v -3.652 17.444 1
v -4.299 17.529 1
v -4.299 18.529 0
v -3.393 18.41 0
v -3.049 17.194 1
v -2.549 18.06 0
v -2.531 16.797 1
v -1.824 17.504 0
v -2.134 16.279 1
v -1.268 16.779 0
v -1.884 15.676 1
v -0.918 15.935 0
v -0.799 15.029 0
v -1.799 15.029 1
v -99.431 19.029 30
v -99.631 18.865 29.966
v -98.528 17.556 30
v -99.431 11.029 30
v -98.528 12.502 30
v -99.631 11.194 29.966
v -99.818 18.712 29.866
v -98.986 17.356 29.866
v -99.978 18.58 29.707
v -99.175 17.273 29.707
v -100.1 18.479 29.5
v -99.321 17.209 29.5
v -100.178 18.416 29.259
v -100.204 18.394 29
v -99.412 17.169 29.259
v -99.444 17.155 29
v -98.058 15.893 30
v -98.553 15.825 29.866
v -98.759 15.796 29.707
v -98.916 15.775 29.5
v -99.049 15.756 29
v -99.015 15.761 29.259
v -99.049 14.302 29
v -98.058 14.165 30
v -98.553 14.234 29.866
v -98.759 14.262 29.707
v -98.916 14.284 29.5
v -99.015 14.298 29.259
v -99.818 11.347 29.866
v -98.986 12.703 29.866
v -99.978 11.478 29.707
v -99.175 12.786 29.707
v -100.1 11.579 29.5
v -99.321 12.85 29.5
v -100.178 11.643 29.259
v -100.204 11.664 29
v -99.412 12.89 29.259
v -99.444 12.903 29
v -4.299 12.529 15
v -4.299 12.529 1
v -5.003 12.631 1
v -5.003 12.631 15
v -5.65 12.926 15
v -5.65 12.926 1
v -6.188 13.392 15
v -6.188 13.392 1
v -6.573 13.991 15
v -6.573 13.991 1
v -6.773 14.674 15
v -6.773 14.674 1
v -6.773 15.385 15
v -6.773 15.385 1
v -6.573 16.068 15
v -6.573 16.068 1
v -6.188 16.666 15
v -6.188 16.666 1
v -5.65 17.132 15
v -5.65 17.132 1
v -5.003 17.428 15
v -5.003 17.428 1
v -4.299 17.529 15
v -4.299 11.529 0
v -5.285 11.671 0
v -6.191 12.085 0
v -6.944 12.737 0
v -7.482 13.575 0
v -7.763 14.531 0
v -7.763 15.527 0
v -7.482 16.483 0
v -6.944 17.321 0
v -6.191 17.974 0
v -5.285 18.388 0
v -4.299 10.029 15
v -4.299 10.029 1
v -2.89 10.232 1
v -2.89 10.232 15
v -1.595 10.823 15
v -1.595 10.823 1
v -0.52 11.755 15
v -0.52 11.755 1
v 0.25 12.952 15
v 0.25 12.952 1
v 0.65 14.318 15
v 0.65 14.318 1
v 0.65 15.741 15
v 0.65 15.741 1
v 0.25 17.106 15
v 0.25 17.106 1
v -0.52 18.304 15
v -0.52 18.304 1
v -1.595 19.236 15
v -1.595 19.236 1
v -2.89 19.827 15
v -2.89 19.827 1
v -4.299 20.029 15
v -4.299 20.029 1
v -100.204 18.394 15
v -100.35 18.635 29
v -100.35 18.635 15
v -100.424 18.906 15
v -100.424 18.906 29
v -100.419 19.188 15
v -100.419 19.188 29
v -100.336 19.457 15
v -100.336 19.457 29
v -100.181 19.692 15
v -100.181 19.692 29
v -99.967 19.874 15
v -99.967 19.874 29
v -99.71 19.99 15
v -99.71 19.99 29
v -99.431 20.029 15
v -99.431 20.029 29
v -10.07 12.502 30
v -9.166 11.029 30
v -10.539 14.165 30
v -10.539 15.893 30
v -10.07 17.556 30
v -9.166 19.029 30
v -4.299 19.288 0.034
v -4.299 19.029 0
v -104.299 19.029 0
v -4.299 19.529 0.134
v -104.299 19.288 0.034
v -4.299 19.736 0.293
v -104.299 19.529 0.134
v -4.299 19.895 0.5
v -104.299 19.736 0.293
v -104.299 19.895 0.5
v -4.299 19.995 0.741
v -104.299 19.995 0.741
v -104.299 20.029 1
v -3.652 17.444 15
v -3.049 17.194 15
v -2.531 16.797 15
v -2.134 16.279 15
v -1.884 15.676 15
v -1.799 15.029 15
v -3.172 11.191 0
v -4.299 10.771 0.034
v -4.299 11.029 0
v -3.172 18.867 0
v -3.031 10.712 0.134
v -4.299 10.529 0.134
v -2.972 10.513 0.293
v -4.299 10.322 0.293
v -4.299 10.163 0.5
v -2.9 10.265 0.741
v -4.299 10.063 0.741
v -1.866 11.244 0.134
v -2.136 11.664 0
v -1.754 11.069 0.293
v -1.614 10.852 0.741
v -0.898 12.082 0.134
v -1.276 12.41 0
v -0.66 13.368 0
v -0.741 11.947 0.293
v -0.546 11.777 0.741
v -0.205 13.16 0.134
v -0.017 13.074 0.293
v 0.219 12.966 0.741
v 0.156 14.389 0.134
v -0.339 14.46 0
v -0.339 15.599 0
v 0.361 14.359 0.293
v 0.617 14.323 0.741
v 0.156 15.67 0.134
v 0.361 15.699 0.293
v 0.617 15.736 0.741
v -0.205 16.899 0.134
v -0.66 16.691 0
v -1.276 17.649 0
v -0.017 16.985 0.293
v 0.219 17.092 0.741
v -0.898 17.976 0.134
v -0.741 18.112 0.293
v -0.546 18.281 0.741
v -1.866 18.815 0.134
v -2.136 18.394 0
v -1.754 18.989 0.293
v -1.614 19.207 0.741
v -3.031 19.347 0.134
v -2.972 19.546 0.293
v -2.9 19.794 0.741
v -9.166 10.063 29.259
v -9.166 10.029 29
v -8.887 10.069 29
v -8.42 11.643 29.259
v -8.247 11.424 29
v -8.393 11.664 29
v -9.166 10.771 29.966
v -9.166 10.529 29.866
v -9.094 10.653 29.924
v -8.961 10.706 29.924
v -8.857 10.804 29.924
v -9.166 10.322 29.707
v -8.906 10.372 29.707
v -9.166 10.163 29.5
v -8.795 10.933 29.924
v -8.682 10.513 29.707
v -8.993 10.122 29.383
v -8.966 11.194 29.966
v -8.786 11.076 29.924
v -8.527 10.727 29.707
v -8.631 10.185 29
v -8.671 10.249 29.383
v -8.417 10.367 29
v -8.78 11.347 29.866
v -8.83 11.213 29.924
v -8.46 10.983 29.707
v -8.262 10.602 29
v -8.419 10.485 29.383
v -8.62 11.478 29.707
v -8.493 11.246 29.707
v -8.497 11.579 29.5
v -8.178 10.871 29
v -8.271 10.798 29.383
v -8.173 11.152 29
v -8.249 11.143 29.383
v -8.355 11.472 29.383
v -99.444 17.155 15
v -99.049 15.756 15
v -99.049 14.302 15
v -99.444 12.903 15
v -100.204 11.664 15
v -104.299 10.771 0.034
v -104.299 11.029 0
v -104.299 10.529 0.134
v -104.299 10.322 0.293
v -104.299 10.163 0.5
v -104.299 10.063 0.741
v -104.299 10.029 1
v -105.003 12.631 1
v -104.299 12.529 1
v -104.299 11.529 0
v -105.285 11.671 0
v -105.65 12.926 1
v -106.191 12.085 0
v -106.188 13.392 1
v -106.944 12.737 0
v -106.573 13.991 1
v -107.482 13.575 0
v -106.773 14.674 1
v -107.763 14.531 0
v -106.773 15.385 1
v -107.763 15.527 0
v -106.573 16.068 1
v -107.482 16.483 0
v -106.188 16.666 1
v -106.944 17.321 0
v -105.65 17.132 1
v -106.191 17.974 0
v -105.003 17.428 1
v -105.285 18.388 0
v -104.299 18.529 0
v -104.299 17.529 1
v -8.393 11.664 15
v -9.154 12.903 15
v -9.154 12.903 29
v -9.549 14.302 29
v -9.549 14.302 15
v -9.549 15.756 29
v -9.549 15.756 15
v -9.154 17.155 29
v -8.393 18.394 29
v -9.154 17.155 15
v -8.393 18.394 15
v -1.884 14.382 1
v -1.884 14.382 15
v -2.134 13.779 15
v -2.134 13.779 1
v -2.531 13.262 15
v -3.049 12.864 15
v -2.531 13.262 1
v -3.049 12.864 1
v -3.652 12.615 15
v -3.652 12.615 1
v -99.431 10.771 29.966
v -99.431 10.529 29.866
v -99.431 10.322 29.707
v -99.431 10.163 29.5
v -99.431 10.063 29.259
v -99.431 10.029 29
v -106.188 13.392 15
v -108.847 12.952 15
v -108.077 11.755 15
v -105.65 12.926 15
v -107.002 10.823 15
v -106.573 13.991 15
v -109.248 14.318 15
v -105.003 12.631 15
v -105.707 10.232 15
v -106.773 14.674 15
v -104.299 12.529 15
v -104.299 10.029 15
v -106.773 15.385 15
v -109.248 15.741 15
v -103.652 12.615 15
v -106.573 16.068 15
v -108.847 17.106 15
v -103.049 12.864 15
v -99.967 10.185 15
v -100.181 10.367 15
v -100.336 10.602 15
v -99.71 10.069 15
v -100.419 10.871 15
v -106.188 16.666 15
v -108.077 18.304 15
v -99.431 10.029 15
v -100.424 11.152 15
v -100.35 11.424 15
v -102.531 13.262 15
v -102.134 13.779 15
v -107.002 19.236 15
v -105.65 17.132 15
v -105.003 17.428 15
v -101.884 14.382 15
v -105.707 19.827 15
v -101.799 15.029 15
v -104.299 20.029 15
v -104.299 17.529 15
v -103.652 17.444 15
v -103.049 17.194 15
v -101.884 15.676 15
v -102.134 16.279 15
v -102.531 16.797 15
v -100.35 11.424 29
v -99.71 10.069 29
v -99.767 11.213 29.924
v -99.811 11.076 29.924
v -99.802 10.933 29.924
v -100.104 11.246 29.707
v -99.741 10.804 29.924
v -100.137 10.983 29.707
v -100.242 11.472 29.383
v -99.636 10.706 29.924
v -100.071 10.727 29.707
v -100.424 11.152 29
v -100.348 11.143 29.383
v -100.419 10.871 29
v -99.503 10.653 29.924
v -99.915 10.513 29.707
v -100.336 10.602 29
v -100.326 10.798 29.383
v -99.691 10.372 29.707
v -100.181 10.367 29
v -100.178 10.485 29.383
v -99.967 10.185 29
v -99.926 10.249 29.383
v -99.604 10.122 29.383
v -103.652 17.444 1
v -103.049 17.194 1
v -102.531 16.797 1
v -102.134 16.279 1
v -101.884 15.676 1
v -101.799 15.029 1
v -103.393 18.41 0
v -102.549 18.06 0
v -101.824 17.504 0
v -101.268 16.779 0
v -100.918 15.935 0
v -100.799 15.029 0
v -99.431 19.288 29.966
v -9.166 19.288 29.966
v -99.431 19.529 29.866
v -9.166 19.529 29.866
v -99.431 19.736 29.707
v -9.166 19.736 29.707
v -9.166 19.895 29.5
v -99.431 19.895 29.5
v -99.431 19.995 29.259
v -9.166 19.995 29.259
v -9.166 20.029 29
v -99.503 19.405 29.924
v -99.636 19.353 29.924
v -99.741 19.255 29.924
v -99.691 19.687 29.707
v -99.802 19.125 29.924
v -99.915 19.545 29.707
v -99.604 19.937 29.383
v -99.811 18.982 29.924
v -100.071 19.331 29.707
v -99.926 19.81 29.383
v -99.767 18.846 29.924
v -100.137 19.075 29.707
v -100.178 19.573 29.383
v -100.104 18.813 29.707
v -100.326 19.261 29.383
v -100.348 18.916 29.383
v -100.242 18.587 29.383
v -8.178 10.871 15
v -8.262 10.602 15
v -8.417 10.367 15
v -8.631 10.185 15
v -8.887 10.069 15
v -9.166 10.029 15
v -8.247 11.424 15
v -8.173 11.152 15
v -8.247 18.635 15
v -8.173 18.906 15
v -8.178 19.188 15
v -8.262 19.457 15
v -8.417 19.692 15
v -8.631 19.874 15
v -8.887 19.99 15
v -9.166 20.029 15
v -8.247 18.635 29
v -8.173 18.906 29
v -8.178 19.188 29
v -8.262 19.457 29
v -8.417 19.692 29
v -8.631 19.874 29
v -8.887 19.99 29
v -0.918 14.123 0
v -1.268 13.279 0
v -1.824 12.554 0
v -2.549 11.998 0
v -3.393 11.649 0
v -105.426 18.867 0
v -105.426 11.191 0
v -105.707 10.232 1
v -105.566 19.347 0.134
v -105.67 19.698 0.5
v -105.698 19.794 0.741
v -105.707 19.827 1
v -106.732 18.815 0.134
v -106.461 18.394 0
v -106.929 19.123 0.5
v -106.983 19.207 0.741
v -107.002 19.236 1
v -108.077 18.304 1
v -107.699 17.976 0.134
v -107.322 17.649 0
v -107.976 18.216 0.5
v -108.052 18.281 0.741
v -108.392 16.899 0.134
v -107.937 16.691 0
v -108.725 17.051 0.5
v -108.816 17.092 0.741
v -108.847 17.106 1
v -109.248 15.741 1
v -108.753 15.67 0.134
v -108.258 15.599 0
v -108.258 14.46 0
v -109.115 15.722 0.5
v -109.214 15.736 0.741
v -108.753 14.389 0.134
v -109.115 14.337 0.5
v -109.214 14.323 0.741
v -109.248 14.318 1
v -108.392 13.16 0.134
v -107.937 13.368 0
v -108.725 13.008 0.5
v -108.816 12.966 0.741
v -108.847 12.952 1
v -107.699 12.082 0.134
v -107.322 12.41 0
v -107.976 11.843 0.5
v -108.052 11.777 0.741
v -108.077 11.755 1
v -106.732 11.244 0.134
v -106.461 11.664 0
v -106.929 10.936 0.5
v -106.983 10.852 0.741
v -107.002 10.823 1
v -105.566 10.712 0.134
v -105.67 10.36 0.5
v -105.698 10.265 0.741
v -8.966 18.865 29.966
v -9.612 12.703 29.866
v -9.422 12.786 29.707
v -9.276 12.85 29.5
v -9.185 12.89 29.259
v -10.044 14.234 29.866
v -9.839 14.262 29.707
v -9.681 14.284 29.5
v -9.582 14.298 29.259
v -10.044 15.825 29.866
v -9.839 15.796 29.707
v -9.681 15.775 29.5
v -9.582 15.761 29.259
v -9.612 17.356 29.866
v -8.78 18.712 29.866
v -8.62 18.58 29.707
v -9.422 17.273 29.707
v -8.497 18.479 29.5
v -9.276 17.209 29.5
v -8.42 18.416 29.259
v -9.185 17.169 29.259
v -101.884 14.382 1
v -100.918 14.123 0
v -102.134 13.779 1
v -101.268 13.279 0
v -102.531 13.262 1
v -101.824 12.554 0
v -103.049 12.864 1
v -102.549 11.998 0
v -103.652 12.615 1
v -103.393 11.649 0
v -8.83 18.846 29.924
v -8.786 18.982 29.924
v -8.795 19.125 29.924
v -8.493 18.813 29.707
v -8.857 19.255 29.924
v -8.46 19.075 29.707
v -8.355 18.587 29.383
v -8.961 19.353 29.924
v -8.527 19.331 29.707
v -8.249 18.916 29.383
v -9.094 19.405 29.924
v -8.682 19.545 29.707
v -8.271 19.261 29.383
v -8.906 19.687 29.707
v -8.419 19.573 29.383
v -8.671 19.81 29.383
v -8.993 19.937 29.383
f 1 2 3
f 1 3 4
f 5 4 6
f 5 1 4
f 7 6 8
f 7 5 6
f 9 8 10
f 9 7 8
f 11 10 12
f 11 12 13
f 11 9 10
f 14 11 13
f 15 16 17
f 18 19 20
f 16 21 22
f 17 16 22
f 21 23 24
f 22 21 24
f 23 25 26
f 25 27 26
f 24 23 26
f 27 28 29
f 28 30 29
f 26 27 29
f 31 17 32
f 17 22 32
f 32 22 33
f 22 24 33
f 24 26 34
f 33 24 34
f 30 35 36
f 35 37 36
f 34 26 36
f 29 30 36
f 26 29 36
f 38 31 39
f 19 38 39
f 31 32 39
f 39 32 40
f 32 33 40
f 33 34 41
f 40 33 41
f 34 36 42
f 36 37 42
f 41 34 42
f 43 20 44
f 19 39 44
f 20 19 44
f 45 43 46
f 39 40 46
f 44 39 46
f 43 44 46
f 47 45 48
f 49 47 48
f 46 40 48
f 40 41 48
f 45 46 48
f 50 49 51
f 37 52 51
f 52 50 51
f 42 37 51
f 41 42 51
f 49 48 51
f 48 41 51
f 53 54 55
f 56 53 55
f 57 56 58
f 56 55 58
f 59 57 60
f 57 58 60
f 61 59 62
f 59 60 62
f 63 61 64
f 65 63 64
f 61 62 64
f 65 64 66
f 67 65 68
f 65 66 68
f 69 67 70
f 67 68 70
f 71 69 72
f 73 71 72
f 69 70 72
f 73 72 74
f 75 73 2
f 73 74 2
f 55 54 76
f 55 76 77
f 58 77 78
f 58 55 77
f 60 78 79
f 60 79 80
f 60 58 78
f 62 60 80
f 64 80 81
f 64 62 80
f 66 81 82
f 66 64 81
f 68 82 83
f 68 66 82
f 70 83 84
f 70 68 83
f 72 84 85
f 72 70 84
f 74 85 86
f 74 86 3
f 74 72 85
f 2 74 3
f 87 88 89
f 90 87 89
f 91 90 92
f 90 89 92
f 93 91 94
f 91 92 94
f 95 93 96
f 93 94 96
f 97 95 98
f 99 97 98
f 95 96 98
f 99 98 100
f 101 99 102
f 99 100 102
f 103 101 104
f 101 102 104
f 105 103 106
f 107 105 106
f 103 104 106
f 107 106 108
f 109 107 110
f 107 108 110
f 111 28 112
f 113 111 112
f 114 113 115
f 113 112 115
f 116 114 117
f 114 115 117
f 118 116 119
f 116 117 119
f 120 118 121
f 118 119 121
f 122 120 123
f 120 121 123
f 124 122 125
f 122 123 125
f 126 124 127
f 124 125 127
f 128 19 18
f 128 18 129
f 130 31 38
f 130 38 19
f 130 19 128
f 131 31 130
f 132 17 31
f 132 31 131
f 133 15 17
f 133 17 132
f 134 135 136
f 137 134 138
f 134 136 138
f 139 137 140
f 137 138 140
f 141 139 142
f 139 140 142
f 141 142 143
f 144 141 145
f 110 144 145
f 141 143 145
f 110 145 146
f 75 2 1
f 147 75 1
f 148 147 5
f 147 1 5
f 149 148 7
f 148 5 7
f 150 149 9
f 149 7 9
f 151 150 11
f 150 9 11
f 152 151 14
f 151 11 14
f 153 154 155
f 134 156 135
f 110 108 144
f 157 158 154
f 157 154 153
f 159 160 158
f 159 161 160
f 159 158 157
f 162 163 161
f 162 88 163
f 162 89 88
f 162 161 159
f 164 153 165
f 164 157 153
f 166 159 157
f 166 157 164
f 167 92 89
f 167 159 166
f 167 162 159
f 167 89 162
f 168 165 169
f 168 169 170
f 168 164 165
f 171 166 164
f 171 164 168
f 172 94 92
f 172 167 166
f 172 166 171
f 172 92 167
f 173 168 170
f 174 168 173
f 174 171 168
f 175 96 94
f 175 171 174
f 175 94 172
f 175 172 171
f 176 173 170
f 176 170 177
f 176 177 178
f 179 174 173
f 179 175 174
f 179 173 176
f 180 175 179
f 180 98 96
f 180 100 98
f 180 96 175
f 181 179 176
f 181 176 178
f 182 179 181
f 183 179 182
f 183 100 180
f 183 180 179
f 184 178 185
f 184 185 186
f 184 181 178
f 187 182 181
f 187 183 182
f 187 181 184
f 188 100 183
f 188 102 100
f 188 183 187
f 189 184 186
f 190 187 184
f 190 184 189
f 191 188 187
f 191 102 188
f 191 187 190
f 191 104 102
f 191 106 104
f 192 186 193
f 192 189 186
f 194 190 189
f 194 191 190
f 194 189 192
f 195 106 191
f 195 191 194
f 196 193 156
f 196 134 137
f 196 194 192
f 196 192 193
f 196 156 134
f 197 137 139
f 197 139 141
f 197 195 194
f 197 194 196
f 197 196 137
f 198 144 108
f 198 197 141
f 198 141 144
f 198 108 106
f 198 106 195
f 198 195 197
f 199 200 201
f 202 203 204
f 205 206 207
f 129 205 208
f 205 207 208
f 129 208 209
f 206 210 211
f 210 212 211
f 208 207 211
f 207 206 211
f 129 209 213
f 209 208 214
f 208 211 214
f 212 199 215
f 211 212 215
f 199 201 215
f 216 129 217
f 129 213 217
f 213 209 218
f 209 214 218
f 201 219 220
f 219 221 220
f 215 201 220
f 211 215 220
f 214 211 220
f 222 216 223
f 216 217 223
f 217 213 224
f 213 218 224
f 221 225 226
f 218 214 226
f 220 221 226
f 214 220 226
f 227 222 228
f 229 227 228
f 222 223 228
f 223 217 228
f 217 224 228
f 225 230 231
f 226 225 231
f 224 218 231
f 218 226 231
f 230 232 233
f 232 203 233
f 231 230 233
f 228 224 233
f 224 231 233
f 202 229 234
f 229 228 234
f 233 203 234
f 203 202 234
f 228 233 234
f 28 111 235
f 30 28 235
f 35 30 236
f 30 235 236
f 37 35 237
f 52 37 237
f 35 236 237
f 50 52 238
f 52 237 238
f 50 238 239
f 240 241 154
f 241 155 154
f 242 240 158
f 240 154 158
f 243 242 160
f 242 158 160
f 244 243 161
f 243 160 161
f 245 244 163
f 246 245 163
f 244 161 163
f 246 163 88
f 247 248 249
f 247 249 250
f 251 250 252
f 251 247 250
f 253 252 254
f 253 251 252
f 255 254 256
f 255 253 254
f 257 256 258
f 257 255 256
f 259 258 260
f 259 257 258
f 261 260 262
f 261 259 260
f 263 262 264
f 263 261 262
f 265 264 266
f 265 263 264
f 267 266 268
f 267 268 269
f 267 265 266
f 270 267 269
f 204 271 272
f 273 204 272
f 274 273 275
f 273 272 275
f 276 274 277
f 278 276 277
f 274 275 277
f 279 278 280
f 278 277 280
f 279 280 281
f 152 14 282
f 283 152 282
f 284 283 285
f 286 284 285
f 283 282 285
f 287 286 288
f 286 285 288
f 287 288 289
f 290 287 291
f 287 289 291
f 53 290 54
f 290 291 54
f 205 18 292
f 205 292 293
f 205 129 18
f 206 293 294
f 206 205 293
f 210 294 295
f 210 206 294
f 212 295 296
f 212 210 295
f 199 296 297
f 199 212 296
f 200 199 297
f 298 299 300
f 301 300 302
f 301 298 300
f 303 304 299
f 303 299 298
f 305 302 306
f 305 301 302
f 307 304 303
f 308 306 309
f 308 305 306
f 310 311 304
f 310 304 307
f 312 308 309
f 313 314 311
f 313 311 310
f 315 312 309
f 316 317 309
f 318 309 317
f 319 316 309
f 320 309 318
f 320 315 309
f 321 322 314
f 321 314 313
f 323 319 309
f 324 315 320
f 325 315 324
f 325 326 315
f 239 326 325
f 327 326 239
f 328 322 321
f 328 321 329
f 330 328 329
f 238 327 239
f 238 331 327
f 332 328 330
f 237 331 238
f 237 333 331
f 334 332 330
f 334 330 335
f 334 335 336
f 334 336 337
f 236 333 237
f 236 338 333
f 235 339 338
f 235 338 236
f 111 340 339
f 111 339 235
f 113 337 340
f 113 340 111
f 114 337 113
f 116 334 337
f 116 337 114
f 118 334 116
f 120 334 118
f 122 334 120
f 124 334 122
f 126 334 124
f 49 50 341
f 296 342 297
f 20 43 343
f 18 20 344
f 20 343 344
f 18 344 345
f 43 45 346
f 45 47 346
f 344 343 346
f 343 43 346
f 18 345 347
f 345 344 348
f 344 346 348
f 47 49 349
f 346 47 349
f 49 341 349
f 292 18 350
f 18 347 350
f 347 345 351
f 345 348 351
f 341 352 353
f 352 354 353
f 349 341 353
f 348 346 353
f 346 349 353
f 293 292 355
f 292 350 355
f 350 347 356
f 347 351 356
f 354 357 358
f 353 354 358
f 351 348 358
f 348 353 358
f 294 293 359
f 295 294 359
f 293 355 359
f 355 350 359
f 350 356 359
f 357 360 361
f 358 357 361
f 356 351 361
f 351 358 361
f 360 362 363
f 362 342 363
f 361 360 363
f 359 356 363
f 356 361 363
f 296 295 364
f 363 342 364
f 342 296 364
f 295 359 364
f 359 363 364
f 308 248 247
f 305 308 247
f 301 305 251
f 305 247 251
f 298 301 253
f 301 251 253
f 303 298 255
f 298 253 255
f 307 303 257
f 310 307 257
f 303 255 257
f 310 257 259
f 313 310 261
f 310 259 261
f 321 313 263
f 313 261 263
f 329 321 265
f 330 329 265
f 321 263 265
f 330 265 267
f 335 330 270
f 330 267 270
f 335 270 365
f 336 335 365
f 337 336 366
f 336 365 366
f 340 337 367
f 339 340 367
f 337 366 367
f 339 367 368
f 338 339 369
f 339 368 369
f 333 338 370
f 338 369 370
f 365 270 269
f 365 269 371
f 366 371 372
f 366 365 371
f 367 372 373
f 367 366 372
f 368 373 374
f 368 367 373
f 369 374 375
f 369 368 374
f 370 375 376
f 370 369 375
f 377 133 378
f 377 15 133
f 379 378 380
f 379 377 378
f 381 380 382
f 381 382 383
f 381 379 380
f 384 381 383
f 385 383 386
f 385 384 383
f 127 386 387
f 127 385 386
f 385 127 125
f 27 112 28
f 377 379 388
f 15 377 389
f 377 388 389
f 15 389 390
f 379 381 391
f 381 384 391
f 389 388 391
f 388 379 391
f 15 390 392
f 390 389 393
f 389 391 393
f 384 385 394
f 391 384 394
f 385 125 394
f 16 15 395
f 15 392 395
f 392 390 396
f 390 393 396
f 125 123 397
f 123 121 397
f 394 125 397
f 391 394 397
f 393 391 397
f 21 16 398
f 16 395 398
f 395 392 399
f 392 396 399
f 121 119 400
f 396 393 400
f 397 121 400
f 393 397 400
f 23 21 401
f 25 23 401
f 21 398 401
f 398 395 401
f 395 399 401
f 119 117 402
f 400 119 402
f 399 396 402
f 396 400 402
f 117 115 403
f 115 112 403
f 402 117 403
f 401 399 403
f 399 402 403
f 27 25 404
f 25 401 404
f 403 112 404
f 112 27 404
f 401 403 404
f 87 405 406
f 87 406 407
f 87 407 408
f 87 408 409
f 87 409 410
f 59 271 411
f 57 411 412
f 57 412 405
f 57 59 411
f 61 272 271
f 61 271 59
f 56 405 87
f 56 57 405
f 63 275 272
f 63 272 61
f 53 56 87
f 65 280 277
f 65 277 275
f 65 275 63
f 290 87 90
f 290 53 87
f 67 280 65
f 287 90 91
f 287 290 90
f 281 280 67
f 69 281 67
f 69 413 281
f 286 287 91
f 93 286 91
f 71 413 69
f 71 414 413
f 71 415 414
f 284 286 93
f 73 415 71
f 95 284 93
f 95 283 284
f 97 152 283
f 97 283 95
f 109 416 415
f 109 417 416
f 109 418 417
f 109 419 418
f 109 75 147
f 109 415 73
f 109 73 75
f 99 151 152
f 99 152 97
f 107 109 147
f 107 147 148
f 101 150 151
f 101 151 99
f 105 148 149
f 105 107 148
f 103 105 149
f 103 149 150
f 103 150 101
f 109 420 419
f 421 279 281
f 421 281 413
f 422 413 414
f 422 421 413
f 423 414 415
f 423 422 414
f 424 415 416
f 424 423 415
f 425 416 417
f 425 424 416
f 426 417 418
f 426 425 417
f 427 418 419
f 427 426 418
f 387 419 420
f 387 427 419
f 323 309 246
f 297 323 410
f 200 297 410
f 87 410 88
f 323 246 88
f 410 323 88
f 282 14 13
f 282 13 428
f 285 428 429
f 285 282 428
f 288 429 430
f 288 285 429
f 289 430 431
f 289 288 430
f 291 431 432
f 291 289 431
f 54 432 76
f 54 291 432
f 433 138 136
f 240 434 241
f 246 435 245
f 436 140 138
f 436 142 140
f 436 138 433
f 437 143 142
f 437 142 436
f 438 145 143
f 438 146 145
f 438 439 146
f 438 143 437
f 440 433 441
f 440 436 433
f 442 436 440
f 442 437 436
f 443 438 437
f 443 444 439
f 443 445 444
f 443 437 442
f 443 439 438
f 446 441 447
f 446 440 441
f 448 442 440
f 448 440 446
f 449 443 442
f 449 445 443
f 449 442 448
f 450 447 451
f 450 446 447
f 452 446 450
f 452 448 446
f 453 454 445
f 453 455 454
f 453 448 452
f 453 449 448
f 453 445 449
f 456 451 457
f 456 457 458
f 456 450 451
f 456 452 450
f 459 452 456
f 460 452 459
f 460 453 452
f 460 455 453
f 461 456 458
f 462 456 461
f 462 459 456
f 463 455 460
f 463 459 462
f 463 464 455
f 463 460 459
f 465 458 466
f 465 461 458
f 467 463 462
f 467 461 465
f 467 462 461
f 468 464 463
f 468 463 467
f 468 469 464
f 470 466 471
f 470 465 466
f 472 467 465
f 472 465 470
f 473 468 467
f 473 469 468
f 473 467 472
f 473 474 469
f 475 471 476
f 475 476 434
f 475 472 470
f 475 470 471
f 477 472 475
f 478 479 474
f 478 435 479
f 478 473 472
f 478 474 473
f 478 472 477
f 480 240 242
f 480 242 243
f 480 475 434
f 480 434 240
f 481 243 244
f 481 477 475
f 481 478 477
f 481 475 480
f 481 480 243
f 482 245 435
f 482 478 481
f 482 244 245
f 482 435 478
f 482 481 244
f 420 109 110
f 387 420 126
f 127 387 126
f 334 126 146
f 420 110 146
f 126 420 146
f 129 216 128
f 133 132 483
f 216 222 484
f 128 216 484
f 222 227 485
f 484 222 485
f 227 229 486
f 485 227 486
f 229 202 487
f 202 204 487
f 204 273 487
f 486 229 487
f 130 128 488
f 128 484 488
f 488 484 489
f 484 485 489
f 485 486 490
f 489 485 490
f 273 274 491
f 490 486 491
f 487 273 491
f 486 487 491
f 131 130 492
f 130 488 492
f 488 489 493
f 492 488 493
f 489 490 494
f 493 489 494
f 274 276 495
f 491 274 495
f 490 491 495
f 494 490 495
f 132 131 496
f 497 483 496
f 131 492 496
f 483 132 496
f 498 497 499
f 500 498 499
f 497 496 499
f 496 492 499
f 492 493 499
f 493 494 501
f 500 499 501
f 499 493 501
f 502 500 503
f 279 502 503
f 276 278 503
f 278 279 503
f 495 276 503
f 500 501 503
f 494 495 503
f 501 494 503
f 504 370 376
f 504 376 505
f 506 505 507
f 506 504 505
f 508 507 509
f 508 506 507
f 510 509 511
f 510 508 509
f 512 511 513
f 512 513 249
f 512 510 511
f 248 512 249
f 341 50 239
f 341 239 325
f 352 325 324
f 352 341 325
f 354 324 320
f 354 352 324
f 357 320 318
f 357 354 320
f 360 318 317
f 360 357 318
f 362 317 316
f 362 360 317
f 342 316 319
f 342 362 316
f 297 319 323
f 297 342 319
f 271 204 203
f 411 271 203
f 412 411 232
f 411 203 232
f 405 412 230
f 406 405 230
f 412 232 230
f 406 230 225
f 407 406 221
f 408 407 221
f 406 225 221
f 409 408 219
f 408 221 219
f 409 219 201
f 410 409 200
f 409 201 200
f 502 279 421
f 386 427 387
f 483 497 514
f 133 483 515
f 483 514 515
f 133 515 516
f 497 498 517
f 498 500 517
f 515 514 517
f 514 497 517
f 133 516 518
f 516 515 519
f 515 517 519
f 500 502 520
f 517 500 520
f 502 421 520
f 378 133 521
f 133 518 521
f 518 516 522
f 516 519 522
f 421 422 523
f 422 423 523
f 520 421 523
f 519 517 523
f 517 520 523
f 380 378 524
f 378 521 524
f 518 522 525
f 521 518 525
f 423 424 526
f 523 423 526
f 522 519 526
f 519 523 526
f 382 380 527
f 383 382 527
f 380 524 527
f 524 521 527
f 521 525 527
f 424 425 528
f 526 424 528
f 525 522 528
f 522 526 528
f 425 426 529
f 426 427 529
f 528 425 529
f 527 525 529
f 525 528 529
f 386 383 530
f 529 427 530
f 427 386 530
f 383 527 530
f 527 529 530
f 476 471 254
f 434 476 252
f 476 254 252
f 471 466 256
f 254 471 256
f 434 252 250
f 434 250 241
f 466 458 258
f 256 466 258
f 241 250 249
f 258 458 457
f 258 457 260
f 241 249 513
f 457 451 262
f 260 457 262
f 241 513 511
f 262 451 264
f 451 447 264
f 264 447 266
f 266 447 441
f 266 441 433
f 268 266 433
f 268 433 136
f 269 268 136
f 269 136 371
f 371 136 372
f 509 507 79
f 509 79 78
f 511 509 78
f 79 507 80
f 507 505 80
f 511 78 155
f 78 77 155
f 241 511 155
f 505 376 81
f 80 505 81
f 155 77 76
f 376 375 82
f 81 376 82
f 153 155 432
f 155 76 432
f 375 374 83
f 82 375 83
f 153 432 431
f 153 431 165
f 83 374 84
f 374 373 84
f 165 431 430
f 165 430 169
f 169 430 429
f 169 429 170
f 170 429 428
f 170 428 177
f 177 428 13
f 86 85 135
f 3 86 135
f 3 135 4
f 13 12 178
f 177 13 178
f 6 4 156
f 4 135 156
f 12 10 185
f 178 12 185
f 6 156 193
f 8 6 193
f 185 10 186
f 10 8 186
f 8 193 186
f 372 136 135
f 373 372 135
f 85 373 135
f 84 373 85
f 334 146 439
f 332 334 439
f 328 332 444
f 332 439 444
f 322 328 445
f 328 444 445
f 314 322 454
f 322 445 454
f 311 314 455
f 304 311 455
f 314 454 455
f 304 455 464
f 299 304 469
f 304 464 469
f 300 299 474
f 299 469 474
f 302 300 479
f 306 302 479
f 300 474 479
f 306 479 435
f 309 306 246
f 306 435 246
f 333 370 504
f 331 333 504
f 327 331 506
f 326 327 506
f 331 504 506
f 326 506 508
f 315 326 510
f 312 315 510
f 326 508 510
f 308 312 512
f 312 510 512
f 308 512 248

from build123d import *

# Parameters (mm, degrees)
F1_DEPTH = 30
F2_DEPTH = 15
F3_R     = 1
F4_R     = 1
F5_SIZE  = 1


with BuildPart() as f1:
    # F0 (on Top) → F1 (new body)
    with BuildSketch(Plane.XY):
        with BuildLine():
            Line((-6.0564657358, 20.029321317), (-102.5407865696, 20.029321317))
            ThreePointArc((-102.5407865696, 20.029321317), (-98.9986261527, 15.029321317), (-102.5407865696, 10.029321317))
            Line((-102.5407865696, 10.029321317), (-6.0564657358, 10.029321317))
            ThreePointArc((-6.0564657358, 10.029321317), (-9.5986261527, 15.029321317), (-6.0564657358, 20.029321317))
        make_face()
    extrude(amount=F1_DEPTH)

    # F0 (on Top) → F2 (join)
    with BuildSketch(Plane.XY):
        with BuildLine():
            Line((-104.2986261527, 17.529321317), (-104.2986261527, 20.029321317))
            ThreePointArc((-104.2986261527, 20.029321317), (-109.2986261527, 15.029321317), (-104.2986261527, 10.029321317))
            Line((-104.2986261527, 10.029321317), (-104.2986261527, 12.529321317))
            ThreePointArc((-104.2986261527, 12.529321317), (-106.7986261527, 15.029321317), (-104.2986261527, 17.529321317))
        make_face()
        with BuildLine():
            Line((-102.5407865696, 20.029321317), (-104.2986261527, 20.029321317))
            Line((-104.2986261527, 20.029321317), (-104.2986261527, 17.529321317))
            ThreePointArc((-104.2986261527, 17.529321317), (-102.5308591998, 16.7970882699), (-101.7986261527, 15.029321317))
            ThreePointArc((-101.7986261527, 15.029321317), (-102.5308591998, 13.261554364), (-104.2986261527, 12.529321317))
            Line((-104.2986261527, 12.529321317), (-104.2986261527, 10.029321317))
            Line((-104.2986261527, 10.029321317), (-102.5407865696, 10.029321317))
            ThreePointArc((-102.5407865696, 10.029321317), (-98.9986261527, 15.029321317), (-102.5407865696, 20.029321317))
        make_face()
        with BuildLine():
            ThreePointArc((-4.2986261527, 10.029321317), (0.7013738473, 15.029321317), (-4.2986261527, 20.029321317))
            Line((-4.2986261527, 20.029321317), (-4.2986261527, 17.529321317))
            ThreePointArc((-4.2986261527, 17.529321317), (-2.5308591998, 16.7970882699), (-1.7986261527, 15.029321317))
            ThreePointArc((-1.7986261527, 15.029321317), (-2.5308591998, 13.261554364), (-4.2986261527, 12.529321317))
            Line((-4.2986261527, 12.529321317), (-4.2986261527, 10.029321317))
        make_face()
        with BuildLine():
            Line((-4.2986261527, 20.029321317), (-6.0564657358, 20.029321317))
            ThreePointArc((-6.0564657358, 20.029321317), (-9.5986261527, 15.029321317), (-6.0564657358, 10.029321317))
            Line((-6.0564657358, 10.029321317), (-4.2986261527, 10.029321317))
            Line((-4.2986261527, 10.029321317), (-4.2986261527, 12.529321317))
            ThreePointArc((-4.2986261527, 12.529321317), (-6.7986261527, 15.029321317), (-4.2986261527, 17.529321317))
            Line((-4.2986261527, 17.529321317), (-4.2986261527, 20.029321317))
        make_face()
    extrude(amount=F2_DEPTH)

    # F3
    f3_edges = [f1.edges().sort_by_distance(p)[0] for p in [
        (-102.540787, 20.029321, 22.5),
        (-102.540787, 10.029321, 22.5),
        (-6.056466, 20.029321, 22.5),
        (-6.056466, 10.029321, 22.5),
    ]]
    fillet(f3_edges, radius=F3_R)

    # F4
    f4_edges = [f1.edges().sort_by_distance(p)[0] for p in [
        (-54.298626, 20.029321, 30),
        (-54.298626, 10.029321, 0),
    ]]
    fillet(f4_edges, radius=F4_R)

    # F5
    f5_edges = [f1.edges().sort_by_distance(p)[0] for p in [
        (-104.298626, 12.529321, 0),
        (-4.298626, 17.529321, 0),
    ]]
    chamfer(f5_edges, length=F5_SIZE)


solid = f1.part
